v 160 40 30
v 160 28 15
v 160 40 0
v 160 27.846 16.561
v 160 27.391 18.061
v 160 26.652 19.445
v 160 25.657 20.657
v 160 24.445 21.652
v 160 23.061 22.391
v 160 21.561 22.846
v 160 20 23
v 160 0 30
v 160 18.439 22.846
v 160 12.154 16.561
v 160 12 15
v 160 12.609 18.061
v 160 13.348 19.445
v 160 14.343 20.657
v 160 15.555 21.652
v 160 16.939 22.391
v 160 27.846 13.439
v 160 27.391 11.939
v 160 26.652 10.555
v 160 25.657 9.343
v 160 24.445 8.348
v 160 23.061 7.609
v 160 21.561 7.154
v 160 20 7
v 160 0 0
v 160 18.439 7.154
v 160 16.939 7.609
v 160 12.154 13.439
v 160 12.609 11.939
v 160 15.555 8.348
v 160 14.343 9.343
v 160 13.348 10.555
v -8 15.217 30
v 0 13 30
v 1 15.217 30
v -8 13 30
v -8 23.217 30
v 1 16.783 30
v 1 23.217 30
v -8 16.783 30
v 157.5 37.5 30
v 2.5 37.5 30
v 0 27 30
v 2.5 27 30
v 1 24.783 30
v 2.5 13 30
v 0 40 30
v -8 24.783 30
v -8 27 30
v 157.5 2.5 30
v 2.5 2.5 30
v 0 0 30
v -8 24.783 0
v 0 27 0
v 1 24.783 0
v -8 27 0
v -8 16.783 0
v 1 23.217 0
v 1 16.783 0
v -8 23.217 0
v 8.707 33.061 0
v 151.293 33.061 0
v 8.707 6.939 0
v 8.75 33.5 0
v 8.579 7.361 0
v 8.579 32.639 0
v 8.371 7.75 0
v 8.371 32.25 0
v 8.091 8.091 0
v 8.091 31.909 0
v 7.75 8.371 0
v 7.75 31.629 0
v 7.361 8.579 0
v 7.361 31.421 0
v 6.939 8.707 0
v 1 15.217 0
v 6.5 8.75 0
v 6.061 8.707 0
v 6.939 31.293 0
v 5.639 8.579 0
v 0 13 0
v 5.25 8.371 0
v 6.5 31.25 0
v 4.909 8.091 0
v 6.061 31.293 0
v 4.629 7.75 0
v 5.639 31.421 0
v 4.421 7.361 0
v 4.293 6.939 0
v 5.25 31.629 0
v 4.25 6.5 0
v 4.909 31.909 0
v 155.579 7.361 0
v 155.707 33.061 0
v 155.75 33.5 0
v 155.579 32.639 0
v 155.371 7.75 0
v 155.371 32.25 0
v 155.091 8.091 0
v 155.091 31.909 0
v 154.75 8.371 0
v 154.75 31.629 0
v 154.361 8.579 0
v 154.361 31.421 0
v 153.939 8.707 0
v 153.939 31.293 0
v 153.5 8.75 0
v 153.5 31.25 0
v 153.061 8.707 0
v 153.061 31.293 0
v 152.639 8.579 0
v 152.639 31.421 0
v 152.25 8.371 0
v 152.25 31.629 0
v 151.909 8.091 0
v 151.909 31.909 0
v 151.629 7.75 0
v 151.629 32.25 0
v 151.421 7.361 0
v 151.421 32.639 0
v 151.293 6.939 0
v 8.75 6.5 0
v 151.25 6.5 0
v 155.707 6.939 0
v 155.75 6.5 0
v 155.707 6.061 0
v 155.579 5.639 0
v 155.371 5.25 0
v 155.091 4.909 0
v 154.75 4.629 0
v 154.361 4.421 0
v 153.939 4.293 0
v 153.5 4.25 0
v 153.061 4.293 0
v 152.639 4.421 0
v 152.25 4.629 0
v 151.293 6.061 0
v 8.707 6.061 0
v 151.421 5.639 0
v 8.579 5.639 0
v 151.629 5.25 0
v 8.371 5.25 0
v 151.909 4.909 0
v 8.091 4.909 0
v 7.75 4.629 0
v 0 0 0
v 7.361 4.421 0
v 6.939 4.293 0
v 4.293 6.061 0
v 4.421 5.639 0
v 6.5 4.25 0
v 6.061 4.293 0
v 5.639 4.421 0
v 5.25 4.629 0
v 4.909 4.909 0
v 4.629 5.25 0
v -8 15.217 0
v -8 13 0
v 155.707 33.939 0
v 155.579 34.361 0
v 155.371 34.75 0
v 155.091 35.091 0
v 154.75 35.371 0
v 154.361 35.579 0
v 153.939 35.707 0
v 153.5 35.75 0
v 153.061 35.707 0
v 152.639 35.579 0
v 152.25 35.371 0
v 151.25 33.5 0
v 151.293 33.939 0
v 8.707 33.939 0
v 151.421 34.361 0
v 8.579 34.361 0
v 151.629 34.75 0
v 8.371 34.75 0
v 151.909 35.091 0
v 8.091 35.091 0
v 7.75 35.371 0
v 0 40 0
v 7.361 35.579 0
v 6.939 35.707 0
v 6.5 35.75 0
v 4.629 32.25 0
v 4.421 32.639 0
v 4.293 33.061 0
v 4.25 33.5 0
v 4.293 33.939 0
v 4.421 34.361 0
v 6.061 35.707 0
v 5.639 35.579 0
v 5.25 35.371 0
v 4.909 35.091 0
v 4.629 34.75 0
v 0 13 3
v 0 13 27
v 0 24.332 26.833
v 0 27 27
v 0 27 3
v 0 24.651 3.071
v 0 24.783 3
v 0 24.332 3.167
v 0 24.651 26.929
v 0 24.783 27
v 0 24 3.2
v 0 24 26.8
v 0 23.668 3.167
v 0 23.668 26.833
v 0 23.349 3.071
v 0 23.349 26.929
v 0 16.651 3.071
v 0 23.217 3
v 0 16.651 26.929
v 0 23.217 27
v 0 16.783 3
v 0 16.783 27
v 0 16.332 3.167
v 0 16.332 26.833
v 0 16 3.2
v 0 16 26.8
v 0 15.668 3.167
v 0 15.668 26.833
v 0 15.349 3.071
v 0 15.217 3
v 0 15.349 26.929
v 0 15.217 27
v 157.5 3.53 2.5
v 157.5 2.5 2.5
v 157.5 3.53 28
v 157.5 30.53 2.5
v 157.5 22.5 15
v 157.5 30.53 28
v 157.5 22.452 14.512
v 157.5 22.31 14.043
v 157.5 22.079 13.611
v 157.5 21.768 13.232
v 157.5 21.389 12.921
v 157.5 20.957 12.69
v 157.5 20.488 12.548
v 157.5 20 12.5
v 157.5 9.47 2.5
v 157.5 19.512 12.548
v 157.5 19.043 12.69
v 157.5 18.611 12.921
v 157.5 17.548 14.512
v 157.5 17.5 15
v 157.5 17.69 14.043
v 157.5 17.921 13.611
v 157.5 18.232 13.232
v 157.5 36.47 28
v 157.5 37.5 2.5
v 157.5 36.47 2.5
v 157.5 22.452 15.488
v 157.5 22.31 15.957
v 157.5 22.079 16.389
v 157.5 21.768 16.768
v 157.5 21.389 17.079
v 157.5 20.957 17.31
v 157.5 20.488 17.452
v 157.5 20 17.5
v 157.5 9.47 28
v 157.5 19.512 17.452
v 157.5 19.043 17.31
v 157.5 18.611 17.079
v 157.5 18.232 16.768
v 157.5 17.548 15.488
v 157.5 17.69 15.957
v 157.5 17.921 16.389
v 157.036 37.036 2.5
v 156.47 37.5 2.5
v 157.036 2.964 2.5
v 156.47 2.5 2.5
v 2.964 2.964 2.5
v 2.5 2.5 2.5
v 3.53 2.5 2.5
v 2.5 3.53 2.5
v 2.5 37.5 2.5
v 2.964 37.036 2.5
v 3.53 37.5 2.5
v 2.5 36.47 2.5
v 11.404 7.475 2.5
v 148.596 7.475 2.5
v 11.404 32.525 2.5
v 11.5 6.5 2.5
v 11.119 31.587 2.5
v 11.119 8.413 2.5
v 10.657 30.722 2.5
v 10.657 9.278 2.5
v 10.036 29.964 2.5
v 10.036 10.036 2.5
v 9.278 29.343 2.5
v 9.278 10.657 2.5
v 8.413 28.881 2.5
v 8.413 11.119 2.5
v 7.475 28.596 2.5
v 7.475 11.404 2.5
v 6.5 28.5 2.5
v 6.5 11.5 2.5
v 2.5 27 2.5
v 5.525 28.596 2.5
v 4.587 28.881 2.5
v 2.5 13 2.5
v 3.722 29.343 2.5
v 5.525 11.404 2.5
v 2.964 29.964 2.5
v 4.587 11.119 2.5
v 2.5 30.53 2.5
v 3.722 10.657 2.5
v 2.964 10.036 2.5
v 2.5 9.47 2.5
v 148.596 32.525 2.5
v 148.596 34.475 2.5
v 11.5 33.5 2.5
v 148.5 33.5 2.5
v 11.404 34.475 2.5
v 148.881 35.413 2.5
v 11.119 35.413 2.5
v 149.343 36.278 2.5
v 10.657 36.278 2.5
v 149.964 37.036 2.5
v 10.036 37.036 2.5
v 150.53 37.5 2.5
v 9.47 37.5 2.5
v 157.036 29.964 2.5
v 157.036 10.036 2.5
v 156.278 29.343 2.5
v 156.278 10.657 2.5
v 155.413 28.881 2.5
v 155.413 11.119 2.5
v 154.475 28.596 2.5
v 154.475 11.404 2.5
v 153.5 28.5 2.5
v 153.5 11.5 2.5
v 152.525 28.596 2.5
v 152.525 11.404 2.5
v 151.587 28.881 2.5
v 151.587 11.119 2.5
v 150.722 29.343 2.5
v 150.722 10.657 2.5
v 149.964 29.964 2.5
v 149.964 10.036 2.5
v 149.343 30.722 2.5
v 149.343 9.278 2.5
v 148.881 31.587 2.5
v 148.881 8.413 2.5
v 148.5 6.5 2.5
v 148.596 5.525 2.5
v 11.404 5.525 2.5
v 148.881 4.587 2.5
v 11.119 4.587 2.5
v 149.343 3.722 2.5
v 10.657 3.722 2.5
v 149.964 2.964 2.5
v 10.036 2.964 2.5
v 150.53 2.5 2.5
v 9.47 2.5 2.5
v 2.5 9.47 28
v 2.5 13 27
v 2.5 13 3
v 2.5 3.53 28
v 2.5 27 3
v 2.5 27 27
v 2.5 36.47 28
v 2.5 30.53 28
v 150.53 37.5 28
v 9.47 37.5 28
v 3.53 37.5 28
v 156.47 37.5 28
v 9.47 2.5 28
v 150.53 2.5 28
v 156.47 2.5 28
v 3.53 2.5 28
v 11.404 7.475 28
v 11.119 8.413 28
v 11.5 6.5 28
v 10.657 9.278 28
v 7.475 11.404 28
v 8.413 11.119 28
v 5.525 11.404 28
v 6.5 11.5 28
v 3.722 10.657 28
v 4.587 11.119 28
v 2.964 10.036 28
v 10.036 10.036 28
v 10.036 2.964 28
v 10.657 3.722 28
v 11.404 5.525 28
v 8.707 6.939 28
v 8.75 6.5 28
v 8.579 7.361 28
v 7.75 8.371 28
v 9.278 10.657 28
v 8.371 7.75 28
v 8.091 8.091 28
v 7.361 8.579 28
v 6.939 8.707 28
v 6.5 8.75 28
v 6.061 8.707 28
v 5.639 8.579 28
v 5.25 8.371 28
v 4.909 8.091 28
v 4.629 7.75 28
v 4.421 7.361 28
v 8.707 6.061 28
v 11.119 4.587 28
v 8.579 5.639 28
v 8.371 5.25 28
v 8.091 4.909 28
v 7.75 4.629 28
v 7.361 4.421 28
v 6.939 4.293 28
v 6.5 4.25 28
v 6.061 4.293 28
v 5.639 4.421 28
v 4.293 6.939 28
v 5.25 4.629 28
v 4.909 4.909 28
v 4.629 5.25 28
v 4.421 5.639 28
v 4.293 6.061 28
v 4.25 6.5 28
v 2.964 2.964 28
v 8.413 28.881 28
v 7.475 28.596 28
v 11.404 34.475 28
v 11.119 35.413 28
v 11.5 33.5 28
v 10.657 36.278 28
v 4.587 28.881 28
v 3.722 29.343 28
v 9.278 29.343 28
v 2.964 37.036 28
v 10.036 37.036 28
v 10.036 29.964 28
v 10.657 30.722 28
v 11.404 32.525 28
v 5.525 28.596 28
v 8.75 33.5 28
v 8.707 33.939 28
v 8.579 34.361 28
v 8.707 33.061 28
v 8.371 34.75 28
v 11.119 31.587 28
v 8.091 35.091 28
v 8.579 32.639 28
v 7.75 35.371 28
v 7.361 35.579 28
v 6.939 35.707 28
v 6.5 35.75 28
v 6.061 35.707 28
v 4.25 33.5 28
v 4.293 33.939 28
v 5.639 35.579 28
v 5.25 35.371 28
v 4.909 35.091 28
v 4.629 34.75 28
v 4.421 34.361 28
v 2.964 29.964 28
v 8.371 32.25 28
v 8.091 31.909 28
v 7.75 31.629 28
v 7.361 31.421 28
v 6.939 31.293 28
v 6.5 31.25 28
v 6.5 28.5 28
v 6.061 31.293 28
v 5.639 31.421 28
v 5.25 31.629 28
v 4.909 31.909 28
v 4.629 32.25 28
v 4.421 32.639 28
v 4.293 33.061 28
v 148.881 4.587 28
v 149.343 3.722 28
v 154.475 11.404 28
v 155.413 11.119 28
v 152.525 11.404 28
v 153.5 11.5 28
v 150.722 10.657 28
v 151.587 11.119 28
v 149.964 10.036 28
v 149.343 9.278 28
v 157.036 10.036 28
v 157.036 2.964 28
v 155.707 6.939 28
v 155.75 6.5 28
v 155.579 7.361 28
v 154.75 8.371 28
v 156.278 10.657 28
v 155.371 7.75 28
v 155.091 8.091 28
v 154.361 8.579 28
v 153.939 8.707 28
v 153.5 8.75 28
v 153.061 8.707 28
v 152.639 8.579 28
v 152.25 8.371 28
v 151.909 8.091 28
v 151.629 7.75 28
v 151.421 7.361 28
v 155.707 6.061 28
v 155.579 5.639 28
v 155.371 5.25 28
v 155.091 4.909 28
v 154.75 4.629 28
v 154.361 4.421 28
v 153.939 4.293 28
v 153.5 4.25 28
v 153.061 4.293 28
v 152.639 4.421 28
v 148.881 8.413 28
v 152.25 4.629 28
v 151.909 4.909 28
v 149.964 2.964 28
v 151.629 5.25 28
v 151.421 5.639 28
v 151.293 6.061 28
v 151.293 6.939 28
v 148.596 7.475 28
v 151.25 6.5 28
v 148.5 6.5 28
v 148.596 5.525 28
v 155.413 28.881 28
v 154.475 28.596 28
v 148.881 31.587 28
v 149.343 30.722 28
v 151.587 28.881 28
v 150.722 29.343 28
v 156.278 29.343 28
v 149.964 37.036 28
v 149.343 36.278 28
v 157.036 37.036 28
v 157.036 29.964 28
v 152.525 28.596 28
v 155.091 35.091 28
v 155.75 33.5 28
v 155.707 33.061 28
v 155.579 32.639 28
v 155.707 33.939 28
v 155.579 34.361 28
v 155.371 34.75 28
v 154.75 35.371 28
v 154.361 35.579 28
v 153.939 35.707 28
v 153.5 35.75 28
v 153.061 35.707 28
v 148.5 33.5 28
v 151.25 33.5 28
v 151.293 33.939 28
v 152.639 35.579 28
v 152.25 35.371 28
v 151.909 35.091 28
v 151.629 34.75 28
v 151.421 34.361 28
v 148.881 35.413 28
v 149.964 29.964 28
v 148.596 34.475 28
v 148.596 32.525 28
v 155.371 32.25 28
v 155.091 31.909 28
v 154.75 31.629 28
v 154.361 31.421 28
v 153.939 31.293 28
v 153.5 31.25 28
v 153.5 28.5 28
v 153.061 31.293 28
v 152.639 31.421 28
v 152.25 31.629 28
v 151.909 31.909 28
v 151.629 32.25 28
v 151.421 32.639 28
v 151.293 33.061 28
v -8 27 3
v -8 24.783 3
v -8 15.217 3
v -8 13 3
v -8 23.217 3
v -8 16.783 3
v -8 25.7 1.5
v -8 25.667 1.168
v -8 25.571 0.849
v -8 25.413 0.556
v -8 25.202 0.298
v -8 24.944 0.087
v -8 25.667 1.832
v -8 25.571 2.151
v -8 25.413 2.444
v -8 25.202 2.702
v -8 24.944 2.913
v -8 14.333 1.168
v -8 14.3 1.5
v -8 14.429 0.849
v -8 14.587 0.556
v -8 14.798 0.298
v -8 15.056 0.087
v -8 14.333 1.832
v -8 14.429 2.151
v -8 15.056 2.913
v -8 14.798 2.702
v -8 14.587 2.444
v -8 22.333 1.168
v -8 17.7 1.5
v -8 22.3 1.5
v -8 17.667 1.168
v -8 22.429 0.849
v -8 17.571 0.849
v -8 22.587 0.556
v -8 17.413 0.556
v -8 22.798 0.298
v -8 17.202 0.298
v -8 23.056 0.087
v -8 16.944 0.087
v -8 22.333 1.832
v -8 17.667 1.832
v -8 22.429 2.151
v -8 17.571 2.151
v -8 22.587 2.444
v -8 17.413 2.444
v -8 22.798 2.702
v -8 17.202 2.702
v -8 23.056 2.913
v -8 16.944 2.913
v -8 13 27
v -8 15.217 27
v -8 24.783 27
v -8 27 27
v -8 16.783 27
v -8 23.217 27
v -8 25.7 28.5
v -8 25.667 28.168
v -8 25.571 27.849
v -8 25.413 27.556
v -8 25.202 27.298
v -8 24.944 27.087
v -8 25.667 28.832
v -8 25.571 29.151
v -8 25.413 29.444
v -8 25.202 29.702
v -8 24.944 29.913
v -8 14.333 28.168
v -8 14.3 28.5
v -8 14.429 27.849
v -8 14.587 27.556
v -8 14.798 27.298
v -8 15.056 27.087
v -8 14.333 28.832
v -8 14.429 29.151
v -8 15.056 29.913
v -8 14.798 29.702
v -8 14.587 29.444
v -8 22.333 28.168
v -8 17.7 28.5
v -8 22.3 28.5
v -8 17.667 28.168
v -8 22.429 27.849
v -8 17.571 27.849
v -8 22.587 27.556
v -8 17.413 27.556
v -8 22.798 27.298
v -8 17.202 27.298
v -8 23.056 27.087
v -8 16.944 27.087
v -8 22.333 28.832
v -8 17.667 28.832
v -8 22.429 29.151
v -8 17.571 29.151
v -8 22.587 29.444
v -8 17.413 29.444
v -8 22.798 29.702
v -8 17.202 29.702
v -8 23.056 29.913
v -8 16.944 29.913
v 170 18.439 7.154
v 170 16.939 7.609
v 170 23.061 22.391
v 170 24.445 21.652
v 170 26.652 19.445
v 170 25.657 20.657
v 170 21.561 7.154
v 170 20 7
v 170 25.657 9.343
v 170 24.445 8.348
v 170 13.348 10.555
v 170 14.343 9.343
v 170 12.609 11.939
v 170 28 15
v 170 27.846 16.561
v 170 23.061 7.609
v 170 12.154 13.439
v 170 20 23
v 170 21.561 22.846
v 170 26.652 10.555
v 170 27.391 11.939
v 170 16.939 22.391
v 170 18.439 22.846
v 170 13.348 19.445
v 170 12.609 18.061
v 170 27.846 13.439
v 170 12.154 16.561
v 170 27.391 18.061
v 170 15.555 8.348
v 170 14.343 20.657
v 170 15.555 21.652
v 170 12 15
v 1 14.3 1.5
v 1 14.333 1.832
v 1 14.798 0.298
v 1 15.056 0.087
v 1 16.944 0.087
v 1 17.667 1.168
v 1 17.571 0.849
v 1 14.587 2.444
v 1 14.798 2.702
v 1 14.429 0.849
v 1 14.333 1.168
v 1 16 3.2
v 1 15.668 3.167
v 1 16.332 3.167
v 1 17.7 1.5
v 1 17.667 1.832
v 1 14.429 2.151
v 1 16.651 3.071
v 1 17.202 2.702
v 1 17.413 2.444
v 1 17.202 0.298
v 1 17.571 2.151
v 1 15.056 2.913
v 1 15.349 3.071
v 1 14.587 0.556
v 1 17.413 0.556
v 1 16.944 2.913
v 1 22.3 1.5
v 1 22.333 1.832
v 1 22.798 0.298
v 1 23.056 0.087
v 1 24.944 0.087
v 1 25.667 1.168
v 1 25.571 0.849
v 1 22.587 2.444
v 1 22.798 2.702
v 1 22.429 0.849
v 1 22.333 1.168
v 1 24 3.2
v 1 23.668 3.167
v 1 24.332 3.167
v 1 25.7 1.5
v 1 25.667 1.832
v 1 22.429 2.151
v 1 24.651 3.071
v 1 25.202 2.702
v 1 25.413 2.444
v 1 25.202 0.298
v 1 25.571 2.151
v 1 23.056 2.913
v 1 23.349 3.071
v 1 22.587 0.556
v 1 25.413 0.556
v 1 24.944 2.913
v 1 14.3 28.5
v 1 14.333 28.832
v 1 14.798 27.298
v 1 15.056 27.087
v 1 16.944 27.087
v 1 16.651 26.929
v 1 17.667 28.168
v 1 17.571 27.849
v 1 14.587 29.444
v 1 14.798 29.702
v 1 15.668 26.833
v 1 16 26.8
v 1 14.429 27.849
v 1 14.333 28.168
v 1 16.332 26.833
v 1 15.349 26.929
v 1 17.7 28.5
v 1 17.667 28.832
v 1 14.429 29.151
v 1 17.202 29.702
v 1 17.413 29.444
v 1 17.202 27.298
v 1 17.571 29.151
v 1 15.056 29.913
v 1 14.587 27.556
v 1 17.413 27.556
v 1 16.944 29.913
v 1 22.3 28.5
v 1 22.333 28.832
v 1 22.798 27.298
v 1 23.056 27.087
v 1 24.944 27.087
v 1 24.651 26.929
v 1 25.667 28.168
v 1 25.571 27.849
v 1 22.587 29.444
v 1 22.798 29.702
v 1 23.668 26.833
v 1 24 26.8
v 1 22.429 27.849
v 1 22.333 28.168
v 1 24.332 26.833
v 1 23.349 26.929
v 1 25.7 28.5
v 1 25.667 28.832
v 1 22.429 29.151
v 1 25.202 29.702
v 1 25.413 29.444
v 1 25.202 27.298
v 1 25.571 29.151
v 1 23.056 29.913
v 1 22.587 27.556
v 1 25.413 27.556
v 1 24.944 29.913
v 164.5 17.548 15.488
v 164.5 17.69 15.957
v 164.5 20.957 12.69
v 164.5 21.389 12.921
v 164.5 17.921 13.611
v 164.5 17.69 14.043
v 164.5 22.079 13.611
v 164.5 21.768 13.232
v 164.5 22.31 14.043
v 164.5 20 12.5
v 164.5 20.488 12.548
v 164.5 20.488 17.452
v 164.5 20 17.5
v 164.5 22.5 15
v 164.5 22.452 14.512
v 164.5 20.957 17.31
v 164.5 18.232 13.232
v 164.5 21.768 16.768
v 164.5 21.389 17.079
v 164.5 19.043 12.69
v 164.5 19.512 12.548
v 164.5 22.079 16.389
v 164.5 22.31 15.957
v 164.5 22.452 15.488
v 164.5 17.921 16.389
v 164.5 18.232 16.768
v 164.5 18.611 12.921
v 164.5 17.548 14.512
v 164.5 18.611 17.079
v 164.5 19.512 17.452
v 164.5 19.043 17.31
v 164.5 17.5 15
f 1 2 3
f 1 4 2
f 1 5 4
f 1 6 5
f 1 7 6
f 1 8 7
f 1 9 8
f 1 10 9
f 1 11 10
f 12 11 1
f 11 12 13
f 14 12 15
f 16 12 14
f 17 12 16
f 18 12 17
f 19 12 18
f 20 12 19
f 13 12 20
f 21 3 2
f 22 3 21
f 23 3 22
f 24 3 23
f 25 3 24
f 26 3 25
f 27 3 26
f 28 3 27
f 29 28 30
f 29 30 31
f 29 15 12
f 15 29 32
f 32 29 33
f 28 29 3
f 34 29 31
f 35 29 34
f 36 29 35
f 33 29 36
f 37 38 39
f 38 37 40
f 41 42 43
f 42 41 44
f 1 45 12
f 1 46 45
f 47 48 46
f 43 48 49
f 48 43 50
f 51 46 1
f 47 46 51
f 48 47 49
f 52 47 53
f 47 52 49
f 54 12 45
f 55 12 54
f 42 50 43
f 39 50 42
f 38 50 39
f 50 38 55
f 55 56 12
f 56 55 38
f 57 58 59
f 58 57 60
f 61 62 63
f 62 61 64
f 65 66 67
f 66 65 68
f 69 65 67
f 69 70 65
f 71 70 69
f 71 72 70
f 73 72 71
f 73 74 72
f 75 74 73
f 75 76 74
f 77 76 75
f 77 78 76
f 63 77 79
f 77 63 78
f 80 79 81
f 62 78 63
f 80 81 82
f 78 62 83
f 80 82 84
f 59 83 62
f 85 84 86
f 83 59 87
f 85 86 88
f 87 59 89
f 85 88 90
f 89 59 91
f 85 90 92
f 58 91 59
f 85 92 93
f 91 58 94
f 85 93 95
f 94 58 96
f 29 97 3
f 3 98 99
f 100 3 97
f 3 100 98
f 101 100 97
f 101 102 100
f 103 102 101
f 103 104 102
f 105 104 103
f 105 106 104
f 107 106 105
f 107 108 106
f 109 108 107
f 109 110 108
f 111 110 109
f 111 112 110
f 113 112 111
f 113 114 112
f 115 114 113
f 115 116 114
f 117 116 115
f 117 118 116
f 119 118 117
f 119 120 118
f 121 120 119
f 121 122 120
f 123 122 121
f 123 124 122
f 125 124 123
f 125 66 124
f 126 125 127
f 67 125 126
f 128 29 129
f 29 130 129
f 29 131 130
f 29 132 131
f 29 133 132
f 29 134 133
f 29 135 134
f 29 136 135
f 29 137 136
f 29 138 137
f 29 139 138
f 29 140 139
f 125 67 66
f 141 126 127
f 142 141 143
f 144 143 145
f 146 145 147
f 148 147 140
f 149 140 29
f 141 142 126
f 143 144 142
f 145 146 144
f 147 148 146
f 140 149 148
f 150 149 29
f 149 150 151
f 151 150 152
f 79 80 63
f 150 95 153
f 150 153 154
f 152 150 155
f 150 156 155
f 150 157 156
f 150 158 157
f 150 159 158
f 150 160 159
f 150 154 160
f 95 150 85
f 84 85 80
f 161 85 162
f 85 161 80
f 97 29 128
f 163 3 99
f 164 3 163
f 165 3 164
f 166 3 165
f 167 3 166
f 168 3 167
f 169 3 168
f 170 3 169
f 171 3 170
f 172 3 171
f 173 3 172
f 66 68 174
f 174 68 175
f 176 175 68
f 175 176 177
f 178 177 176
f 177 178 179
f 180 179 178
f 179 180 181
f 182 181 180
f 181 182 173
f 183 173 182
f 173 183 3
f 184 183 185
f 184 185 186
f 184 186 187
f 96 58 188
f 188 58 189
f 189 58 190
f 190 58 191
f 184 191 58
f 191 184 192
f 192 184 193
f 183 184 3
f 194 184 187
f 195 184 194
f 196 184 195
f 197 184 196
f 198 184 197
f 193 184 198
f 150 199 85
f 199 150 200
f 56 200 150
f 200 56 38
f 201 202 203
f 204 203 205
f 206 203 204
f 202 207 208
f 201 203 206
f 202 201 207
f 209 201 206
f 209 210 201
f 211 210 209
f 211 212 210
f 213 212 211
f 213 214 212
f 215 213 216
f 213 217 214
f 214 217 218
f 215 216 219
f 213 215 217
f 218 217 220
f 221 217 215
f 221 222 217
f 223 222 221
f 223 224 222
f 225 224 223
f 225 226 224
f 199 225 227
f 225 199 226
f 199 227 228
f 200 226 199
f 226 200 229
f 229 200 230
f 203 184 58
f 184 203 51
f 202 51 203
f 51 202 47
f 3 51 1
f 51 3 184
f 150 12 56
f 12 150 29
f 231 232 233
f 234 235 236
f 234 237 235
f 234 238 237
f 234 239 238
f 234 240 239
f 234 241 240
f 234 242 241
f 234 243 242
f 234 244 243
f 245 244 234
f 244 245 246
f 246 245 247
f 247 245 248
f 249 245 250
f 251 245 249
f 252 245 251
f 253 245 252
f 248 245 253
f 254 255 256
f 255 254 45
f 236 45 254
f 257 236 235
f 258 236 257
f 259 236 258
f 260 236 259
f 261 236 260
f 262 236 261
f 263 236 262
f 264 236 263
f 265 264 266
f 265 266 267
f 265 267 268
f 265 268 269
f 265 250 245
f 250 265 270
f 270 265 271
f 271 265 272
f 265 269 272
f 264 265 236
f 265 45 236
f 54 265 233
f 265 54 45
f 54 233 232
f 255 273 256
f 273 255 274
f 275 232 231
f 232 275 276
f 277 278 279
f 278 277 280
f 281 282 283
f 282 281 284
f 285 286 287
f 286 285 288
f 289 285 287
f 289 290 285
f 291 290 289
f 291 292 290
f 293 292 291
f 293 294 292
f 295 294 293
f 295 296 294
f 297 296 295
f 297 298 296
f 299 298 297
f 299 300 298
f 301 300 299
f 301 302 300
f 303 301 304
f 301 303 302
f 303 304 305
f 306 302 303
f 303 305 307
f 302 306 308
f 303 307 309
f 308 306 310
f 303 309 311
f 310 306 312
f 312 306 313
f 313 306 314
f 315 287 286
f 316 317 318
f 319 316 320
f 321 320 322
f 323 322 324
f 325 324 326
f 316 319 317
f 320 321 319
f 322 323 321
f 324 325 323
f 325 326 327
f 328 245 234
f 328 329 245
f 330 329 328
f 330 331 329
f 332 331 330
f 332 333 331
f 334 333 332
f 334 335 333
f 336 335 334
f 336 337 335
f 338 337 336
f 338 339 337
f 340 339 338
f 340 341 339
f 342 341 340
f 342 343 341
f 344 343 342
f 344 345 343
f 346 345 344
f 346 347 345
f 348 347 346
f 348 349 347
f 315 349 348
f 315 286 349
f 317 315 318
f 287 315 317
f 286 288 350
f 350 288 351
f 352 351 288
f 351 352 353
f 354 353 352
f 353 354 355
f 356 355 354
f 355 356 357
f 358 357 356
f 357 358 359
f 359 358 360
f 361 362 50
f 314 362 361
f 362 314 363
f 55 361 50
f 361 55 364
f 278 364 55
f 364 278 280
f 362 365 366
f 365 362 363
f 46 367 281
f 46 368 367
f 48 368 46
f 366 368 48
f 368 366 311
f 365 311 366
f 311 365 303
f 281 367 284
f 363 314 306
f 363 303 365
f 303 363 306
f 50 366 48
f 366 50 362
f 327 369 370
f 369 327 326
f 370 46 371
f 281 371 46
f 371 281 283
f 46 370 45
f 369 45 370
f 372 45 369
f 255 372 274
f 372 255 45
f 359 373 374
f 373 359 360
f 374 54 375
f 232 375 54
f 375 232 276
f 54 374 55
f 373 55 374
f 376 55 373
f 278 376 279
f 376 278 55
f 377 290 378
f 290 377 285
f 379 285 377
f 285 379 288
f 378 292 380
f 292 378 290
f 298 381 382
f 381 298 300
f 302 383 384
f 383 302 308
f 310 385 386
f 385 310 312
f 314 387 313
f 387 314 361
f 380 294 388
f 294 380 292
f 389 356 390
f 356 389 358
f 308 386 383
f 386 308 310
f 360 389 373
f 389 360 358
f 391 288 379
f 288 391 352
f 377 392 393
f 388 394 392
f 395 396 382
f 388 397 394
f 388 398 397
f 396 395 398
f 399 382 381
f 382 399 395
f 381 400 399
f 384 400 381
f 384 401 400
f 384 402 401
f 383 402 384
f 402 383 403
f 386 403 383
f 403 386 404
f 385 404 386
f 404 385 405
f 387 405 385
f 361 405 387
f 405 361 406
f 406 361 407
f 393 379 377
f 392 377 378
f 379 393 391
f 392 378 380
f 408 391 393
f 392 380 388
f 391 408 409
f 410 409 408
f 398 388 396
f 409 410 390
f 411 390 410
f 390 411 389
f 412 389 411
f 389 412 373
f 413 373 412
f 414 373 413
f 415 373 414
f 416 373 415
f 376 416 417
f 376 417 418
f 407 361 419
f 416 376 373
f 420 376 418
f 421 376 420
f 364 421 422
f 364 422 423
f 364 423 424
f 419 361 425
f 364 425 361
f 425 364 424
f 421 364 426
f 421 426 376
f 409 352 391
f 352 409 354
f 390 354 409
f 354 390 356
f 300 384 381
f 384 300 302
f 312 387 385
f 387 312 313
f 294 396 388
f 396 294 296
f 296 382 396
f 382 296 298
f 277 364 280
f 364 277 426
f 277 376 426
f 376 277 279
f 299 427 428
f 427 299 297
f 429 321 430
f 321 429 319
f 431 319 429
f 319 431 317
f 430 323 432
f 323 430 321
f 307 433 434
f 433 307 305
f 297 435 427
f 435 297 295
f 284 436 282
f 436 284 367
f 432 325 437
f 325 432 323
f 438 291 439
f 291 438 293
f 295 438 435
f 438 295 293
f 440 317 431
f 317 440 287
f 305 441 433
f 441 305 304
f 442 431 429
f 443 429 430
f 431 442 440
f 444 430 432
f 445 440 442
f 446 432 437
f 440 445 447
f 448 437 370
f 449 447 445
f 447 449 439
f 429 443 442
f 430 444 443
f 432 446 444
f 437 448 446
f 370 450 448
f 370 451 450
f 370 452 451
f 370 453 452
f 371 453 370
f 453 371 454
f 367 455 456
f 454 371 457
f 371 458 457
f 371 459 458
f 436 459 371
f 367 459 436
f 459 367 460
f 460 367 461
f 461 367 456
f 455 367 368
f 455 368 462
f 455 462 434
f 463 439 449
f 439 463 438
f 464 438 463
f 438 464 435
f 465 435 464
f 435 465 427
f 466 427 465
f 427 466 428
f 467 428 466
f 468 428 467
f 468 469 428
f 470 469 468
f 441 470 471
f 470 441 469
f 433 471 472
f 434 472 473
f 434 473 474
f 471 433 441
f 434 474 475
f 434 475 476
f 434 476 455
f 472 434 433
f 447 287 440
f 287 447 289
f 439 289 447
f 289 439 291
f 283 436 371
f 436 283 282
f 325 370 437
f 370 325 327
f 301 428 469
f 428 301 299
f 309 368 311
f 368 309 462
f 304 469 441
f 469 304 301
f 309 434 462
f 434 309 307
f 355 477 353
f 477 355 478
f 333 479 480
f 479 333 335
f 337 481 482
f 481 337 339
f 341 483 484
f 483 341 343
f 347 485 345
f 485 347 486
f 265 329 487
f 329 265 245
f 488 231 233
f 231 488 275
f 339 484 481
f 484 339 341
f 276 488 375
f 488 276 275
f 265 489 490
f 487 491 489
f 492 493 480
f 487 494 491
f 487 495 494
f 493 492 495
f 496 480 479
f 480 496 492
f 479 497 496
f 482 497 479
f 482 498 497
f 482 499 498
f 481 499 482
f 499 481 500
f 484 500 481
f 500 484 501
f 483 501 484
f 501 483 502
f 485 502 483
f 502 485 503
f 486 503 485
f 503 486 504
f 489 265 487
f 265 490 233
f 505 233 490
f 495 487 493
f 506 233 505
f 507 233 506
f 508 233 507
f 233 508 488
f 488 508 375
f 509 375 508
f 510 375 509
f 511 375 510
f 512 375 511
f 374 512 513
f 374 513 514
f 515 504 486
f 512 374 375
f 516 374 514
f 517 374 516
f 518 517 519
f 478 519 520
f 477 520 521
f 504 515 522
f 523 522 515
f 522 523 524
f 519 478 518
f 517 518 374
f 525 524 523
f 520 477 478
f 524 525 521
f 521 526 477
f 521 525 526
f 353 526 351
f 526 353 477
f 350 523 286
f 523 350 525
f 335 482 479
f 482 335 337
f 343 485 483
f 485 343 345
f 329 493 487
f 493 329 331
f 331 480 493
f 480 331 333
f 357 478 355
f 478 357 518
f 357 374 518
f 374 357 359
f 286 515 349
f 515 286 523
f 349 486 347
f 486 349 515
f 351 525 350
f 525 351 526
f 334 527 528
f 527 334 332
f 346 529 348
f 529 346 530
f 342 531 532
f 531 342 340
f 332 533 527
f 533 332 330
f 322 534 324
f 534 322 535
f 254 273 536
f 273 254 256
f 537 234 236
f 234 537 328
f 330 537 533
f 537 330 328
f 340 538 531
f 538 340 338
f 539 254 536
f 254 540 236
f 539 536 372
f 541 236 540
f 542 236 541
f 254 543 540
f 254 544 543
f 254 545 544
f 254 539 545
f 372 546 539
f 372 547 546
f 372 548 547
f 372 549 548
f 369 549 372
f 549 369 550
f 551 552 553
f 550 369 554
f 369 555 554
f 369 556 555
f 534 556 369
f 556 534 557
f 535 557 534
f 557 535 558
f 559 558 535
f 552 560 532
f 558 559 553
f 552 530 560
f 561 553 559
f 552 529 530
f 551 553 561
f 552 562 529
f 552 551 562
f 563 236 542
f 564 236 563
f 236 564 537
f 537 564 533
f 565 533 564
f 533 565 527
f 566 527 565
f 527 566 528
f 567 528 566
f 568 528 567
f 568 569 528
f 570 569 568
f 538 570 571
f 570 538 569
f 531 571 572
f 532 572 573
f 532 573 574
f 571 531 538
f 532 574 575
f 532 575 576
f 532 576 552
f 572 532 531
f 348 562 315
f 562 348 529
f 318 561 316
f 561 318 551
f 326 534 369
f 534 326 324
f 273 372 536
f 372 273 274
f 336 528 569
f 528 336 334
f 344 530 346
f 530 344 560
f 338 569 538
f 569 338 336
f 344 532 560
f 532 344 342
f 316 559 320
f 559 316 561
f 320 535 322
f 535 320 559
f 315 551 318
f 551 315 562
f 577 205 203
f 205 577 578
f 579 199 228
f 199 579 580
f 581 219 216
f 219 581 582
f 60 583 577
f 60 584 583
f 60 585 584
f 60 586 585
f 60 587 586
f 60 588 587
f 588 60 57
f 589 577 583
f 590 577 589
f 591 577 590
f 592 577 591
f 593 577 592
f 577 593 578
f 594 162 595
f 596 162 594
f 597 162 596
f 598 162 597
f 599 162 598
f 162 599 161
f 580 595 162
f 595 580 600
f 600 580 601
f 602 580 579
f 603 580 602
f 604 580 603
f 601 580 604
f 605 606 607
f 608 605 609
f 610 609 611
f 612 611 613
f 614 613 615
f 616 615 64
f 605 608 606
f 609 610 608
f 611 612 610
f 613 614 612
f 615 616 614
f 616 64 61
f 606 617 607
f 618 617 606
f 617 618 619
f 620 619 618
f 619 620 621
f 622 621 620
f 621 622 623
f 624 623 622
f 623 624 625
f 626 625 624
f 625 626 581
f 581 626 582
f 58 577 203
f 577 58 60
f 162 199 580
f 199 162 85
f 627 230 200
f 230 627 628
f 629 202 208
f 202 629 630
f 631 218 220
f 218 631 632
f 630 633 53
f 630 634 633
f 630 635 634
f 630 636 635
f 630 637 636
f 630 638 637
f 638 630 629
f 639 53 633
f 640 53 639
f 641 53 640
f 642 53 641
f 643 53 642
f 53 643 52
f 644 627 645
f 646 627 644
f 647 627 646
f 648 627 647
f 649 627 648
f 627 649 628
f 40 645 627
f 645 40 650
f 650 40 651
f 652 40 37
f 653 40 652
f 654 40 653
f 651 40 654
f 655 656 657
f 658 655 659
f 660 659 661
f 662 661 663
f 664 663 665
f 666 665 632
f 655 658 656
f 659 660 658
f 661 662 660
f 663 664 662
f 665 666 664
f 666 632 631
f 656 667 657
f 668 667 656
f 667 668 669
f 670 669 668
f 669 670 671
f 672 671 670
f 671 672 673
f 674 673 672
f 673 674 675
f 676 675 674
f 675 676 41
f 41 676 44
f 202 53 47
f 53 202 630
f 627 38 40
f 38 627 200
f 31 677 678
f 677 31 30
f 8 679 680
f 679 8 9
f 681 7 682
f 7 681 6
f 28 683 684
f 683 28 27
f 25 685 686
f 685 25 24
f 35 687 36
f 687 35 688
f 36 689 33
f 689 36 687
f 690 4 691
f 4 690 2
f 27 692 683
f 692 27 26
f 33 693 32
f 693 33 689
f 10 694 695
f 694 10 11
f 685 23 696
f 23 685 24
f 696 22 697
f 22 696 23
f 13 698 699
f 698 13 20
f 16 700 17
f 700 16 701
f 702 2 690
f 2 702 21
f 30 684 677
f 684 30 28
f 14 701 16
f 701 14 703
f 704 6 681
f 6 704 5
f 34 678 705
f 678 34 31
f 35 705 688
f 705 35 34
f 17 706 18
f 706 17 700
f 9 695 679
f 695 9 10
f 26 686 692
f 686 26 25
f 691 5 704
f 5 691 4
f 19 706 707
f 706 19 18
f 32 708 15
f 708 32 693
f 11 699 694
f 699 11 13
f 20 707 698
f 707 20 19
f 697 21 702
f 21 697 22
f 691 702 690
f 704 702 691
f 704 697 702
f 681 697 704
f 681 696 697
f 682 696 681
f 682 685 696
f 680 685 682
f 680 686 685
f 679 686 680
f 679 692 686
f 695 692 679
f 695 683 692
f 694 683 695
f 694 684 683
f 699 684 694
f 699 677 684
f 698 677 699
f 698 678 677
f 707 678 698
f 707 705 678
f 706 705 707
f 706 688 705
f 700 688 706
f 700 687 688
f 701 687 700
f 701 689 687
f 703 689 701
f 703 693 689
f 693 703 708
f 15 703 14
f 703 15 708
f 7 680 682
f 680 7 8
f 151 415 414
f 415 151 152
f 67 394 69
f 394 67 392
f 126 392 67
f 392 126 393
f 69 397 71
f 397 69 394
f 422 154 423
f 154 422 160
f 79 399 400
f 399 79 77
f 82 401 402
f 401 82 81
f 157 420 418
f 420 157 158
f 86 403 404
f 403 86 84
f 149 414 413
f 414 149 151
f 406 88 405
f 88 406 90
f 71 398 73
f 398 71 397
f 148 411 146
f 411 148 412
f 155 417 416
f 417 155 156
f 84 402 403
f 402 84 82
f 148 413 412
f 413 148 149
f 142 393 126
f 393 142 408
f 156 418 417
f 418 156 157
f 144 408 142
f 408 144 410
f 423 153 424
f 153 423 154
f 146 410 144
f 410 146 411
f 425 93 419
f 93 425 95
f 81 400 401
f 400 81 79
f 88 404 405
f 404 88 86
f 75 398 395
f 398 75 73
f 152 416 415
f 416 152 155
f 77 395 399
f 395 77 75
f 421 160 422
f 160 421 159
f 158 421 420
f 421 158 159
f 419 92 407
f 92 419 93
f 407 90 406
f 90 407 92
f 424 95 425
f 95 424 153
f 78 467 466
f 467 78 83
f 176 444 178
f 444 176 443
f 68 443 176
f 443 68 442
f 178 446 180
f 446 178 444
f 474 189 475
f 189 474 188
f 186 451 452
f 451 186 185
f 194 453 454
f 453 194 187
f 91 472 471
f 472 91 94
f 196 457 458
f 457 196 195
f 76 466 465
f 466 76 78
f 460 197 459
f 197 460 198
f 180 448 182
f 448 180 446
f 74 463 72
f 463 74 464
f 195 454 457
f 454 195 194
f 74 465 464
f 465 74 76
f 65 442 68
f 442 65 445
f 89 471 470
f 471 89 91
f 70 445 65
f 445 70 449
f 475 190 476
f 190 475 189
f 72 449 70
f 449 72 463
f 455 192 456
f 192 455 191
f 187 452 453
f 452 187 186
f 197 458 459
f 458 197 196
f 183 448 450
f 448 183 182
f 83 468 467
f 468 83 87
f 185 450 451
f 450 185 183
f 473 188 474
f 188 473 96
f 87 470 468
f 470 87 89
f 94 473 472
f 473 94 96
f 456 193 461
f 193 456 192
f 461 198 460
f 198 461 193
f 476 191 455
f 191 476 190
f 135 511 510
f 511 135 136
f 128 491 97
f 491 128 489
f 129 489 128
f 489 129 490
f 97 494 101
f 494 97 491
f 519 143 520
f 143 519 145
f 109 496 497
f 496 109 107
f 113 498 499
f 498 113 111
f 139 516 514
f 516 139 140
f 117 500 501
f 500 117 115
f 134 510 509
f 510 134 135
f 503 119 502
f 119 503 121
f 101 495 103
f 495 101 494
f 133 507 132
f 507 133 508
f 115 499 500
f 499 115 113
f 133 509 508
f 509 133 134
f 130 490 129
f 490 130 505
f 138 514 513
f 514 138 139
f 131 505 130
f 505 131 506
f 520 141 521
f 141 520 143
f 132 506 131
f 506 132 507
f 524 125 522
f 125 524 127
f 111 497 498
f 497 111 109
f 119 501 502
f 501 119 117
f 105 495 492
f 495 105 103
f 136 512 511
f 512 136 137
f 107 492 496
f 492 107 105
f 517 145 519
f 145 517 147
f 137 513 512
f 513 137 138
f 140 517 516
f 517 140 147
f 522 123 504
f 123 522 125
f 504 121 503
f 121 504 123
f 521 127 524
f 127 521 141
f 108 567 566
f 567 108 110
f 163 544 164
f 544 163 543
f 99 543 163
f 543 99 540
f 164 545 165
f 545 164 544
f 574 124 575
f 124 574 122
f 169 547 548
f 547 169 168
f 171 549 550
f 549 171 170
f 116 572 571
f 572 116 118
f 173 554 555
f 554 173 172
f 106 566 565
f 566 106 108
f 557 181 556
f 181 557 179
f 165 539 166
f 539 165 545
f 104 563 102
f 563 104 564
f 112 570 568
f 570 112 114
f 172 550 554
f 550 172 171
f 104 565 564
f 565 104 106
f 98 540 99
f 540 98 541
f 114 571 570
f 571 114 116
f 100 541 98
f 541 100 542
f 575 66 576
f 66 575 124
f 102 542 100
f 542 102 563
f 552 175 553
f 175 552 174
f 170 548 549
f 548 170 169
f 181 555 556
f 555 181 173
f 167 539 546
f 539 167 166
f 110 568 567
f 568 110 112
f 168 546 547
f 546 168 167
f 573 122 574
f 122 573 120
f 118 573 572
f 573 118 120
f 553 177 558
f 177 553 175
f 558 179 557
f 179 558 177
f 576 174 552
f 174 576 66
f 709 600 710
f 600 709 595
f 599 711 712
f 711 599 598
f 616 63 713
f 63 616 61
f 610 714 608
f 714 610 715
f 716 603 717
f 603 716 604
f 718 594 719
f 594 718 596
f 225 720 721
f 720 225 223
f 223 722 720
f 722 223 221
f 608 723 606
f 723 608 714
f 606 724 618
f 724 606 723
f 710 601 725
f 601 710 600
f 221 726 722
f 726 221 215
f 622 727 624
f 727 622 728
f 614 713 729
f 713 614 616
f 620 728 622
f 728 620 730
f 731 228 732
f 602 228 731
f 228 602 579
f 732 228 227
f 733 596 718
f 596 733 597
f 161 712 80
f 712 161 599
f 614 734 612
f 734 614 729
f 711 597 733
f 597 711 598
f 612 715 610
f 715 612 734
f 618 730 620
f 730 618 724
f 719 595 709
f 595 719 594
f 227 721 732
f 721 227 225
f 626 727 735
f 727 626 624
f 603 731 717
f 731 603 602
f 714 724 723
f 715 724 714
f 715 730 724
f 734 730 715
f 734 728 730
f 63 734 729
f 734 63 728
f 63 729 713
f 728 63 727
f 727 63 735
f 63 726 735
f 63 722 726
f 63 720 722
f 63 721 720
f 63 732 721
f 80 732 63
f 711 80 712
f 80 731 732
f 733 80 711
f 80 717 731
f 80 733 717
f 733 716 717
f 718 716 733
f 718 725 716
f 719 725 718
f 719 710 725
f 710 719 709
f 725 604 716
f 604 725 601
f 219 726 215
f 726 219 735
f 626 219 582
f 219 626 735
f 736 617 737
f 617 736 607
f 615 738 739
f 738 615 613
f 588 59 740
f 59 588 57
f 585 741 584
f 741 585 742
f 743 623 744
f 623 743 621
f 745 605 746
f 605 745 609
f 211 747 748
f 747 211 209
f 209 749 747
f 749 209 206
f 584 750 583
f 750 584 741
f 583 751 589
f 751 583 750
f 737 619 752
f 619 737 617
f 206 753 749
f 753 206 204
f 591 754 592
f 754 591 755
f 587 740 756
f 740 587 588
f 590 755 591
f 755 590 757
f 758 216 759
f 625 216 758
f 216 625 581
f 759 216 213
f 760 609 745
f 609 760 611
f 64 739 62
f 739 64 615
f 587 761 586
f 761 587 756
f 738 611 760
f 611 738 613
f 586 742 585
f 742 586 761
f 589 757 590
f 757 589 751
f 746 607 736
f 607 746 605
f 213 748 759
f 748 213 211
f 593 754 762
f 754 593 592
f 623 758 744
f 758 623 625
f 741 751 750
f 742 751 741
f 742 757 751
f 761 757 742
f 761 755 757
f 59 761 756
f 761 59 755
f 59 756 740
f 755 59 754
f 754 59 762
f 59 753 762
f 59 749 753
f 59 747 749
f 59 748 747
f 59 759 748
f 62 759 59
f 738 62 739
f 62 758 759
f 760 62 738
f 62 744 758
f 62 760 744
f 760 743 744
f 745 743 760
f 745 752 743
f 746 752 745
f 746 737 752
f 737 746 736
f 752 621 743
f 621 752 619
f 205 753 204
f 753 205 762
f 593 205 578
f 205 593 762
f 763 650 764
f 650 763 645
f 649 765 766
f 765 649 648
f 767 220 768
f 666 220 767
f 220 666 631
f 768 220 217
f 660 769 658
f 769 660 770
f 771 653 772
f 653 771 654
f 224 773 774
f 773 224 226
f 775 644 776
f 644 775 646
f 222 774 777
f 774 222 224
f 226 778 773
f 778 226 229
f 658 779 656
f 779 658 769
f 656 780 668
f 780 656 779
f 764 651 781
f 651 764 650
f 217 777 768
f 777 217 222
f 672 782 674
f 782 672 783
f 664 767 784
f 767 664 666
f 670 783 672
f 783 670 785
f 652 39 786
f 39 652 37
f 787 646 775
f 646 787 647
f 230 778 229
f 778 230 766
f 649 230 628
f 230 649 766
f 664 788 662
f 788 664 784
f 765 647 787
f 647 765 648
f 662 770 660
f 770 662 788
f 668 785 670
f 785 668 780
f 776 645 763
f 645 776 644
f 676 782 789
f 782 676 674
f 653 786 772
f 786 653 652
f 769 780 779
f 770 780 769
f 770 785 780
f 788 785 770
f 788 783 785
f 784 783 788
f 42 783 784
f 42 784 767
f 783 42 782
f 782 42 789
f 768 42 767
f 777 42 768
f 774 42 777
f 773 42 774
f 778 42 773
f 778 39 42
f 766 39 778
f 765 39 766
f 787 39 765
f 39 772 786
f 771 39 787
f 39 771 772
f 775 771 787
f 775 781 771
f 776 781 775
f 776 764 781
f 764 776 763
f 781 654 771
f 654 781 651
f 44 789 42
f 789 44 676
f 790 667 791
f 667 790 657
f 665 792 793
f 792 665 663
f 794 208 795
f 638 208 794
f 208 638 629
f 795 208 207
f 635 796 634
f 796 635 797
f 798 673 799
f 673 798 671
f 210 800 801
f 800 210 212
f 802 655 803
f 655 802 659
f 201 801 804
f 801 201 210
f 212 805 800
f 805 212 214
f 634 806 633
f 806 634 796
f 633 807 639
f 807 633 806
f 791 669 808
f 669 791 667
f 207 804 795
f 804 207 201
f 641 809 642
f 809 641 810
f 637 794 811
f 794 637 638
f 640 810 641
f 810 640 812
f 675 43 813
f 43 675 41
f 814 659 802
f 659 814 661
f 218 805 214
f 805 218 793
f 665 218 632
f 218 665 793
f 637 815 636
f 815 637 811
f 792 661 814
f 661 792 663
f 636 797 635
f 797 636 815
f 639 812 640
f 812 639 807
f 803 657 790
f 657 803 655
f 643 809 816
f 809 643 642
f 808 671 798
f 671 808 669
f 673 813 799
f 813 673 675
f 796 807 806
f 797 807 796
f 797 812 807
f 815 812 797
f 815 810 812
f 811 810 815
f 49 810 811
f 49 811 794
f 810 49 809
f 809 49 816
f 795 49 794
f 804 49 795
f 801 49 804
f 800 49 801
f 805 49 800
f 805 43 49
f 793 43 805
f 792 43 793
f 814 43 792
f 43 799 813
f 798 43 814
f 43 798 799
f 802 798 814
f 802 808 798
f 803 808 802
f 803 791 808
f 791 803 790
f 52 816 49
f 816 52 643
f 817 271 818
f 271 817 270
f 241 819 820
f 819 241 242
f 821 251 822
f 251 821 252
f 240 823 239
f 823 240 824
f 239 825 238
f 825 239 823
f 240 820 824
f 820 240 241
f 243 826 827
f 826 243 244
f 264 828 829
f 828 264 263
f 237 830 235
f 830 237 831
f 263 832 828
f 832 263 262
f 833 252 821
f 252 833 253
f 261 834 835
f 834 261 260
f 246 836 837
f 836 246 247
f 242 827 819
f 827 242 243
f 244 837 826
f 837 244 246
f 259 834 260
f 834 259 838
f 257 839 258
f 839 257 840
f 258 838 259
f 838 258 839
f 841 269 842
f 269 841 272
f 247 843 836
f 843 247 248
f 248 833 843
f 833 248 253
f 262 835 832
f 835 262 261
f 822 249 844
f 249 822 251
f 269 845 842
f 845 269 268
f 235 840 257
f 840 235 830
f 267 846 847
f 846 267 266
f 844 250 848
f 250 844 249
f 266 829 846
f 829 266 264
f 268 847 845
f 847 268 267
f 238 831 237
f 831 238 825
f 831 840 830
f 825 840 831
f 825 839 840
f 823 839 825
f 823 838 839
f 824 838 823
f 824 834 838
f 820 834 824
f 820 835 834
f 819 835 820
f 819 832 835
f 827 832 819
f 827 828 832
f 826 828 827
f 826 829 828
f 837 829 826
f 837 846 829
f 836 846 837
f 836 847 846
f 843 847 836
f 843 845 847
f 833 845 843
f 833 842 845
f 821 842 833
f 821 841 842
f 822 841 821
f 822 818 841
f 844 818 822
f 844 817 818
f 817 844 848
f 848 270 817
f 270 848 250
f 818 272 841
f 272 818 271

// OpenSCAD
$fn = 32;

// ----------------------------------------------------------------------
// Enclosure body: 160 x 40 x 30 mm, wall 2.5 mm
// ----------------------------------------------------------------------

// --- parameters (mm) ---
length = 160;             // outside length, X
width = 40;               // outside width, Y
height = 30;              // outside height, Z
wall = 2.5;               // side wall thickness
floor_t = 2.5;            // floor thickness
boss_d = 10;              // corner boss diameter
boss_h = 25.5;            // corner boss height above the floor
boss_hole_d = 4.5;        // lid screw clearance in the boss
boss_lip = 6.5;           // boss centre inset from the corner
ear_w = 14;               // mounting ear width
ear_t = 3;                // mounting ear thickness
ear_ext = 8;              // mounting ear reach
ear_hole_d = 3.4;         // mounting ear drills
nipple_d = 16;            // cable gland boss diameter
nipple_h = 10;            // cable gland boss height
nipple_bore = 5;          // cable gland bore

module shell() {
  difference() {
    cube([length, width, height]);
    /* hollow, open at the top */
    translate([wall, wall, floor_t])
      cube([length - 2 * wall, width - 2 * wall, height]);
  }
}

module bosses() {
  /* corner bosses, sunk 1 mm into the floor */
  for (sx = [0, 1]) for (sy = [0, 1])
    translate([sx * (length - 2 * boss_lip) + boss_lip, sy * (width - 2 * boss_lip) + boss_lip, floor_t - 1])
      cylinder(h = boss_h + 1, d = boss_d);
}

module gland() {
  /* boss on the short wall, sunk 1 mm into it */
  translate([length - 1, width / 2, height * 0.5]) rotate([0, 90, 0])
    cylinder(h = nipple_h + 1, d = nipple_d);
}

module ears() {
  /* mounting ears on the short walls, sunk into the wall */
  for (sz = [0, 1])
    translate([-ear_ext, width / 2 - ear_w / 2, sz * (height - ear_t)])
      cube([ear_ext + 2.5, ear_w, ear_t]);
}

difference() {
  union() {
    shell();
    bosses();
    gland();
    ears();
  }
  /* boss screw holes */
  for (sx = [0, 1]) for (sy = [0, 1])
    translate([sx * (length - 2 * boss_lip) + boss_lip, sy * (width - 2 * boss_lip) + boss_lip, -1]) cylinder(h = floor_t + boss_h + 2, d = boss_hole_d);
  translate([length, width / 2, height * 0.5]) rotate([0, 90, 0]) translate([0, 0, -nipple_h - 2]) cylinder(h = nipple_h + wall + 4, d = nipple_bore);
  for (sz = [0, 1]) for (sx = [0, 1]) translate([-ear_ext - 1, width / 2 + (2 * sx - 1) * (ear_w / 2 - 3), sz * (height - ear_t) + ear_t / 2]) rotate([0, 90, 0]) cylinder(h = ear_ext + 2, d = ear_hole_d);
}
